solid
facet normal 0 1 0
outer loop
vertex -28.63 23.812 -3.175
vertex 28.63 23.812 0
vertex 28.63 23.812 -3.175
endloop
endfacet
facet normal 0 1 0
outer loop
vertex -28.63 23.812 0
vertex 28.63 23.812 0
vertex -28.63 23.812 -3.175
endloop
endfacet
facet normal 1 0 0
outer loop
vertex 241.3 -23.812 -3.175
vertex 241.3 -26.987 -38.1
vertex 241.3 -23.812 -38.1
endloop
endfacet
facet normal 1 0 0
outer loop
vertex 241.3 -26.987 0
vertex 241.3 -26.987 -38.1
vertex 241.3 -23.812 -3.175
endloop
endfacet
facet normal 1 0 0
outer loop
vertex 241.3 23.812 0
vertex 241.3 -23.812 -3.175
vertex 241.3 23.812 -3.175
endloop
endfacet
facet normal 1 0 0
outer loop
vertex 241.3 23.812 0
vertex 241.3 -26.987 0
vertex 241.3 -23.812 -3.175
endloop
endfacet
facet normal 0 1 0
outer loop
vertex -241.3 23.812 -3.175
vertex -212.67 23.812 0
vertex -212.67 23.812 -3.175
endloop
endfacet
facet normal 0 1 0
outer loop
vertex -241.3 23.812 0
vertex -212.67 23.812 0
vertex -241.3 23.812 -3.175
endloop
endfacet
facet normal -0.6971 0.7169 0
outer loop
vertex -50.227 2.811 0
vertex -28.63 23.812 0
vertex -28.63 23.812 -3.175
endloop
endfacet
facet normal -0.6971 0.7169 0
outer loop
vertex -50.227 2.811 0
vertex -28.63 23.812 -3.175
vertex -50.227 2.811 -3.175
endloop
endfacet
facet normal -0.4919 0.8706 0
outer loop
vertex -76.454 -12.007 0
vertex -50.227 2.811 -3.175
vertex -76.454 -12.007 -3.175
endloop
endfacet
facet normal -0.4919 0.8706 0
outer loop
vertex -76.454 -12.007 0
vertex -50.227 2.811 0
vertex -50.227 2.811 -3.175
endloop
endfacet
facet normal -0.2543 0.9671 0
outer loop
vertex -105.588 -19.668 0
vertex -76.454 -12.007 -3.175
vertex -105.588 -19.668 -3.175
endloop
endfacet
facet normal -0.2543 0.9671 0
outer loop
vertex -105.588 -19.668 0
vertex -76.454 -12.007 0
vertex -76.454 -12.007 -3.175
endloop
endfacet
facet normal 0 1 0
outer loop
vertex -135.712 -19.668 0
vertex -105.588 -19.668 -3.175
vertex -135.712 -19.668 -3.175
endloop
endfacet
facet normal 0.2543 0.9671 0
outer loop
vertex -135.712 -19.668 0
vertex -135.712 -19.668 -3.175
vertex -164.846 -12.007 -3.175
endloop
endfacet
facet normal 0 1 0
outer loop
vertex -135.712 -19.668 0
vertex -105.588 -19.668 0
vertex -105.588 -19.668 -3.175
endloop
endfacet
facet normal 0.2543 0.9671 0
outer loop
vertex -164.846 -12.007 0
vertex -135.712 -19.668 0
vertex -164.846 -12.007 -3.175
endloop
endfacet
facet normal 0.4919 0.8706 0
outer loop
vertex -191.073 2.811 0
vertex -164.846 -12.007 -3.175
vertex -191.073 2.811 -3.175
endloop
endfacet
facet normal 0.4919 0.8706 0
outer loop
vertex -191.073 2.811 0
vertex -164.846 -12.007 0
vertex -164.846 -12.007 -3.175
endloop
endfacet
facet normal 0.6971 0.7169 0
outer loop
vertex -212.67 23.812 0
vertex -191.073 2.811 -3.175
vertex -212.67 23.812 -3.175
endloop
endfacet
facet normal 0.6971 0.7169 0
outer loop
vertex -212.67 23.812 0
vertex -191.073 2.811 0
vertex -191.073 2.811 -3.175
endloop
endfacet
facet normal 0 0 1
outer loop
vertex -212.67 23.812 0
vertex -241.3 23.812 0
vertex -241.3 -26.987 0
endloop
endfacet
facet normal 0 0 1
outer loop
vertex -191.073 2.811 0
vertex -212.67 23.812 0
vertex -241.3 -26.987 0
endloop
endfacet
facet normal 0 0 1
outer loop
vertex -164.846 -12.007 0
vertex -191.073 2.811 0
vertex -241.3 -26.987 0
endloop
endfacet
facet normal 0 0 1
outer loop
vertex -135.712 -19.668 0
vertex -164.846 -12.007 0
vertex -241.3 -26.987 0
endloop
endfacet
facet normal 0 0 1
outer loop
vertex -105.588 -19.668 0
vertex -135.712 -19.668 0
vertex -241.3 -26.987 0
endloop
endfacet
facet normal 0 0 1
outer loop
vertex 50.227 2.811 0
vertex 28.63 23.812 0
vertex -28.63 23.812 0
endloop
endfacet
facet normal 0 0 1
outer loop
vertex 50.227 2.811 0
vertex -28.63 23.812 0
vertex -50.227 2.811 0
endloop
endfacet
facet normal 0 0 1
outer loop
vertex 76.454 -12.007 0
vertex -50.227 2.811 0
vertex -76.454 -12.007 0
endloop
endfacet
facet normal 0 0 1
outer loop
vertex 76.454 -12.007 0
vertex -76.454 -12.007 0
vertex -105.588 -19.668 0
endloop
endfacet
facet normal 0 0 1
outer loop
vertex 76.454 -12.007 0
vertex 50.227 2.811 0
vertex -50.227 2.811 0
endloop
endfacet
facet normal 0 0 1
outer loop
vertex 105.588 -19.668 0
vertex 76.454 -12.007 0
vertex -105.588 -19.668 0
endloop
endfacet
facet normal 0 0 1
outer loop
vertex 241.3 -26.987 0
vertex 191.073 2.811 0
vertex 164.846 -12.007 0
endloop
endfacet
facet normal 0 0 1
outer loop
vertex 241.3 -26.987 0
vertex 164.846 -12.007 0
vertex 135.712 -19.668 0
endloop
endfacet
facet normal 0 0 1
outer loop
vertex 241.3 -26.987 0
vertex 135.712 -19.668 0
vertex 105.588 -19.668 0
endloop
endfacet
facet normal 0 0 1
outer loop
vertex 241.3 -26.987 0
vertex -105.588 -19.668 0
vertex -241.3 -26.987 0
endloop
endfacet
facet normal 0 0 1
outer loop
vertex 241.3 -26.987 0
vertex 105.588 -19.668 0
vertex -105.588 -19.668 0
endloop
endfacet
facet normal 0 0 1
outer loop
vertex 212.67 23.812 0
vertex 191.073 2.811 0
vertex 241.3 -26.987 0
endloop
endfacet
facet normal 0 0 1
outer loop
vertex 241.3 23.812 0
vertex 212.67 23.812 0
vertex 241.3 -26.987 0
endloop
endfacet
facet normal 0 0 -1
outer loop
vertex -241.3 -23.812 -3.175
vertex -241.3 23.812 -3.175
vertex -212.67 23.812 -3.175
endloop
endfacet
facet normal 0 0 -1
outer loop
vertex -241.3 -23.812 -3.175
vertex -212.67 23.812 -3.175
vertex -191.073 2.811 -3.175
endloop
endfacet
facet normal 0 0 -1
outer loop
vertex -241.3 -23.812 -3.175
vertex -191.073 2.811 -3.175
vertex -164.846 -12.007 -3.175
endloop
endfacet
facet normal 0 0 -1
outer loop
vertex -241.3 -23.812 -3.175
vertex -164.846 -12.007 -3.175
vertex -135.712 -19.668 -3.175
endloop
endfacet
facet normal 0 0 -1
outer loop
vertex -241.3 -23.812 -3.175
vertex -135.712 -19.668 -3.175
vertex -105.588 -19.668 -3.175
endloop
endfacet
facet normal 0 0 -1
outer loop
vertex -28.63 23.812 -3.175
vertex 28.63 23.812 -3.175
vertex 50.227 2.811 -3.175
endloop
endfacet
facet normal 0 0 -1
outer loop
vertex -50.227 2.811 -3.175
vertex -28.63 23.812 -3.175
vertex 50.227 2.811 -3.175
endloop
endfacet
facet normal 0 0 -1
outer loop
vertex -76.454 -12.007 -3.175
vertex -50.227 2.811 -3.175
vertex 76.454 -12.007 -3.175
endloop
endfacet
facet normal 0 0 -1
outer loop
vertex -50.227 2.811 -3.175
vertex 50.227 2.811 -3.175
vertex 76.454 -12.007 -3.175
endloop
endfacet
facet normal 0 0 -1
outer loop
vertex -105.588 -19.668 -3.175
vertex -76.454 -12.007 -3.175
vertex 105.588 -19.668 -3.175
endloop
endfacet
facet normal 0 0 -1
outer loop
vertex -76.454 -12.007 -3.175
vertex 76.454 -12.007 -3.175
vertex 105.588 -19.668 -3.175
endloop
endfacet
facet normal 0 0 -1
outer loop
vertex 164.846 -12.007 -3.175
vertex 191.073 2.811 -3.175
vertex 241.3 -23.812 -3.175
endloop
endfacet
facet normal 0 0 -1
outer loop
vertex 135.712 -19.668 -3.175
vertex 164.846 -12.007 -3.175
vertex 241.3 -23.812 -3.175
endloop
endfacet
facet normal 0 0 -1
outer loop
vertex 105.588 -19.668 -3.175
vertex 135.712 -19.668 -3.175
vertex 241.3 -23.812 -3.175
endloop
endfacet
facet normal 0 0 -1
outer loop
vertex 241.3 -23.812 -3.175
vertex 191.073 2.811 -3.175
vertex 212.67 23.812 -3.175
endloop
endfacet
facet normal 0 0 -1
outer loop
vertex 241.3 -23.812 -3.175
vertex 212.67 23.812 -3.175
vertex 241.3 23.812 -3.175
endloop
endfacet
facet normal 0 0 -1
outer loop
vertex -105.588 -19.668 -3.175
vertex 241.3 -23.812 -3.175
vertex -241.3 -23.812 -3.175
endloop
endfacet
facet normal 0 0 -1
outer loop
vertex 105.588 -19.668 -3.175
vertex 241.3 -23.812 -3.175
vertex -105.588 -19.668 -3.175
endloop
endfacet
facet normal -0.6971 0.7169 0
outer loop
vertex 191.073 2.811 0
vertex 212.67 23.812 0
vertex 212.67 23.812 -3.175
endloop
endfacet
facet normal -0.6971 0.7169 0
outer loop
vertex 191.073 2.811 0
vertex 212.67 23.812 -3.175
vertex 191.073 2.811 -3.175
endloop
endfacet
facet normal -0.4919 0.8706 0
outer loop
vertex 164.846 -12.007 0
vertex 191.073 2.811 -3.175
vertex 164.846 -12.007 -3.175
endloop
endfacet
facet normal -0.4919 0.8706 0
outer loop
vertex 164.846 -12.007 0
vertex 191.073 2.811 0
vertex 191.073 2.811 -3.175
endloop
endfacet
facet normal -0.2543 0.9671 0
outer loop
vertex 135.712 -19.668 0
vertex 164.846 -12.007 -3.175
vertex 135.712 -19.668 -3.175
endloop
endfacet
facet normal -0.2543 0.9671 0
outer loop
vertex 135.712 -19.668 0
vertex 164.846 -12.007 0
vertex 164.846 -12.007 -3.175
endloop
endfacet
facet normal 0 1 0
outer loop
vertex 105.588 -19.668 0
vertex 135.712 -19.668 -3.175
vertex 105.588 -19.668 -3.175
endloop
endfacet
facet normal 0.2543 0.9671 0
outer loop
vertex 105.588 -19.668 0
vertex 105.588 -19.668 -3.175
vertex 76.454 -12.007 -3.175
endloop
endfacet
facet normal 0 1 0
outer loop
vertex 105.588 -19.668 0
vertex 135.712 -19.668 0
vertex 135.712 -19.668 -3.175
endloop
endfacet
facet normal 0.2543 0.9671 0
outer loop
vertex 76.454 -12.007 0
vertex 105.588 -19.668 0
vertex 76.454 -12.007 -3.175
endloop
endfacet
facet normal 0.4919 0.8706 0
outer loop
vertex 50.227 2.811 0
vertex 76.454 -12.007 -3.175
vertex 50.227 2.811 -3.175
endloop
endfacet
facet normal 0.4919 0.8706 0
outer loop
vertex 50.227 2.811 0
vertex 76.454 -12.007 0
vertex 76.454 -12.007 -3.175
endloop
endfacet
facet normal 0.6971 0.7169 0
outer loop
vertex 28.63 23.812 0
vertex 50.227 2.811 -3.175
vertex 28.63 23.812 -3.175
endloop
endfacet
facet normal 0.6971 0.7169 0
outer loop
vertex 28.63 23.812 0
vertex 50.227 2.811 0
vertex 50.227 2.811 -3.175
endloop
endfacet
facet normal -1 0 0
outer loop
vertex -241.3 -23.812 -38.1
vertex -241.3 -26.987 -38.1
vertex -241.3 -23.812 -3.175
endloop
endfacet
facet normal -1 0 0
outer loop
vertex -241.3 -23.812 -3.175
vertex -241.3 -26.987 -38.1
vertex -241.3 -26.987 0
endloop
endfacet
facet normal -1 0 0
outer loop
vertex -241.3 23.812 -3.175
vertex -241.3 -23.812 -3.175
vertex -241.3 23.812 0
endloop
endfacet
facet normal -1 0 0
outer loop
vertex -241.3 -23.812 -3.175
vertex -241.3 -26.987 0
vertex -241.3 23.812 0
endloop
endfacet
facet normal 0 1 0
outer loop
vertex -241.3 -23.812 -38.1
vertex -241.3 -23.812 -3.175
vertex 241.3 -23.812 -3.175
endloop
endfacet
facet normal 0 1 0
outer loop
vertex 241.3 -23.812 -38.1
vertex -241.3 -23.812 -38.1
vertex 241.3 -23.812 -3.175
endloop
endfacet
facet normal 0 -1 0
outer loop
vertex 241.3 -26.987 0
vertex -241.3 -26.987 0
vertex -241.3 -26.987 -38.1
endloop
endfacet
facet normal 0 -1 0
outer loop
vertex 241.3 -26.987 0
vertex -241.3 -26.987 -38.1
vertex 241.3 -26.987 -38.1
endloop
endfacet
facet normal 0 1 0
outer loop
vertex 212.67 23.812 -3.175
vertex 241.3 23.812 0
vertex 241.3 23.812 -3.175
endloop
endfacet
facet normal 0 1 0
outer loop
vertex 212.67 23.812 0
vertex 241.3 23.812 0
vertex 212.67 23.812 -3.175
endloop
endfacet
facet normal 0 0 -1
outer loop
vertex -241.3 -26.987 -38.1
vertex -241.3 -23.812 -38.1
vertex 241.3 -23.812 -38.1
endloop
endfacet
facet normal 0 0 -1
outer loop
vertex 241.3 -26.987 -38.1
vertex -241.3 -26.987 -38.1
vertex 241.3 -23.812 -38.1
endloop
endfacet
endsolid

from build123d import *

# Parameters (mm, degrees)
F1_DEPTH = 3.175
F0_W     = 482.6
F0_H     = 3.175
F2_DEPTH = 38.1


with BuildPart() as f1:
    # F0 (on Top) → F1 (new body)
    with BuildSketch(Plane.XY):
        with BuildLine():
            Line((-241.3, -23.8125), (241.3, -23.8125))
            Line((241.3, -23.8125), (241.3, 23.8125))
            Line((241.3, 23.8125), (212.6702423383, 23.8125))
            ThreePointArc((212.6702423383, 23.8125), (120.65, -20.6375), (28.6297576617, 23.8125))
            Line((28.6297576617, 23.8125), (-28.6297576617, 23.8125))
            ThreePointArc((-28.6297576617, 23.8125), (-120.65, -20.6375), (-212.6702423383, 23.8125))
            Line((-212.6702423383, 23.8125), (-241.3, 23.8125))
            Line((-241.3, 23.8125), (-241.3, -23.8125))
        make_face()
    extrude(amount=-F1_DEPTH)

    # F0 (on Top) → F2 (join)
    with BuildSketch(Plane.XY):
        with Locations((0, -25.4)):
            Rectangle(F0_W, F0_H)
    extrude(amount=-F2_DEPTH)


solid = f1.part
